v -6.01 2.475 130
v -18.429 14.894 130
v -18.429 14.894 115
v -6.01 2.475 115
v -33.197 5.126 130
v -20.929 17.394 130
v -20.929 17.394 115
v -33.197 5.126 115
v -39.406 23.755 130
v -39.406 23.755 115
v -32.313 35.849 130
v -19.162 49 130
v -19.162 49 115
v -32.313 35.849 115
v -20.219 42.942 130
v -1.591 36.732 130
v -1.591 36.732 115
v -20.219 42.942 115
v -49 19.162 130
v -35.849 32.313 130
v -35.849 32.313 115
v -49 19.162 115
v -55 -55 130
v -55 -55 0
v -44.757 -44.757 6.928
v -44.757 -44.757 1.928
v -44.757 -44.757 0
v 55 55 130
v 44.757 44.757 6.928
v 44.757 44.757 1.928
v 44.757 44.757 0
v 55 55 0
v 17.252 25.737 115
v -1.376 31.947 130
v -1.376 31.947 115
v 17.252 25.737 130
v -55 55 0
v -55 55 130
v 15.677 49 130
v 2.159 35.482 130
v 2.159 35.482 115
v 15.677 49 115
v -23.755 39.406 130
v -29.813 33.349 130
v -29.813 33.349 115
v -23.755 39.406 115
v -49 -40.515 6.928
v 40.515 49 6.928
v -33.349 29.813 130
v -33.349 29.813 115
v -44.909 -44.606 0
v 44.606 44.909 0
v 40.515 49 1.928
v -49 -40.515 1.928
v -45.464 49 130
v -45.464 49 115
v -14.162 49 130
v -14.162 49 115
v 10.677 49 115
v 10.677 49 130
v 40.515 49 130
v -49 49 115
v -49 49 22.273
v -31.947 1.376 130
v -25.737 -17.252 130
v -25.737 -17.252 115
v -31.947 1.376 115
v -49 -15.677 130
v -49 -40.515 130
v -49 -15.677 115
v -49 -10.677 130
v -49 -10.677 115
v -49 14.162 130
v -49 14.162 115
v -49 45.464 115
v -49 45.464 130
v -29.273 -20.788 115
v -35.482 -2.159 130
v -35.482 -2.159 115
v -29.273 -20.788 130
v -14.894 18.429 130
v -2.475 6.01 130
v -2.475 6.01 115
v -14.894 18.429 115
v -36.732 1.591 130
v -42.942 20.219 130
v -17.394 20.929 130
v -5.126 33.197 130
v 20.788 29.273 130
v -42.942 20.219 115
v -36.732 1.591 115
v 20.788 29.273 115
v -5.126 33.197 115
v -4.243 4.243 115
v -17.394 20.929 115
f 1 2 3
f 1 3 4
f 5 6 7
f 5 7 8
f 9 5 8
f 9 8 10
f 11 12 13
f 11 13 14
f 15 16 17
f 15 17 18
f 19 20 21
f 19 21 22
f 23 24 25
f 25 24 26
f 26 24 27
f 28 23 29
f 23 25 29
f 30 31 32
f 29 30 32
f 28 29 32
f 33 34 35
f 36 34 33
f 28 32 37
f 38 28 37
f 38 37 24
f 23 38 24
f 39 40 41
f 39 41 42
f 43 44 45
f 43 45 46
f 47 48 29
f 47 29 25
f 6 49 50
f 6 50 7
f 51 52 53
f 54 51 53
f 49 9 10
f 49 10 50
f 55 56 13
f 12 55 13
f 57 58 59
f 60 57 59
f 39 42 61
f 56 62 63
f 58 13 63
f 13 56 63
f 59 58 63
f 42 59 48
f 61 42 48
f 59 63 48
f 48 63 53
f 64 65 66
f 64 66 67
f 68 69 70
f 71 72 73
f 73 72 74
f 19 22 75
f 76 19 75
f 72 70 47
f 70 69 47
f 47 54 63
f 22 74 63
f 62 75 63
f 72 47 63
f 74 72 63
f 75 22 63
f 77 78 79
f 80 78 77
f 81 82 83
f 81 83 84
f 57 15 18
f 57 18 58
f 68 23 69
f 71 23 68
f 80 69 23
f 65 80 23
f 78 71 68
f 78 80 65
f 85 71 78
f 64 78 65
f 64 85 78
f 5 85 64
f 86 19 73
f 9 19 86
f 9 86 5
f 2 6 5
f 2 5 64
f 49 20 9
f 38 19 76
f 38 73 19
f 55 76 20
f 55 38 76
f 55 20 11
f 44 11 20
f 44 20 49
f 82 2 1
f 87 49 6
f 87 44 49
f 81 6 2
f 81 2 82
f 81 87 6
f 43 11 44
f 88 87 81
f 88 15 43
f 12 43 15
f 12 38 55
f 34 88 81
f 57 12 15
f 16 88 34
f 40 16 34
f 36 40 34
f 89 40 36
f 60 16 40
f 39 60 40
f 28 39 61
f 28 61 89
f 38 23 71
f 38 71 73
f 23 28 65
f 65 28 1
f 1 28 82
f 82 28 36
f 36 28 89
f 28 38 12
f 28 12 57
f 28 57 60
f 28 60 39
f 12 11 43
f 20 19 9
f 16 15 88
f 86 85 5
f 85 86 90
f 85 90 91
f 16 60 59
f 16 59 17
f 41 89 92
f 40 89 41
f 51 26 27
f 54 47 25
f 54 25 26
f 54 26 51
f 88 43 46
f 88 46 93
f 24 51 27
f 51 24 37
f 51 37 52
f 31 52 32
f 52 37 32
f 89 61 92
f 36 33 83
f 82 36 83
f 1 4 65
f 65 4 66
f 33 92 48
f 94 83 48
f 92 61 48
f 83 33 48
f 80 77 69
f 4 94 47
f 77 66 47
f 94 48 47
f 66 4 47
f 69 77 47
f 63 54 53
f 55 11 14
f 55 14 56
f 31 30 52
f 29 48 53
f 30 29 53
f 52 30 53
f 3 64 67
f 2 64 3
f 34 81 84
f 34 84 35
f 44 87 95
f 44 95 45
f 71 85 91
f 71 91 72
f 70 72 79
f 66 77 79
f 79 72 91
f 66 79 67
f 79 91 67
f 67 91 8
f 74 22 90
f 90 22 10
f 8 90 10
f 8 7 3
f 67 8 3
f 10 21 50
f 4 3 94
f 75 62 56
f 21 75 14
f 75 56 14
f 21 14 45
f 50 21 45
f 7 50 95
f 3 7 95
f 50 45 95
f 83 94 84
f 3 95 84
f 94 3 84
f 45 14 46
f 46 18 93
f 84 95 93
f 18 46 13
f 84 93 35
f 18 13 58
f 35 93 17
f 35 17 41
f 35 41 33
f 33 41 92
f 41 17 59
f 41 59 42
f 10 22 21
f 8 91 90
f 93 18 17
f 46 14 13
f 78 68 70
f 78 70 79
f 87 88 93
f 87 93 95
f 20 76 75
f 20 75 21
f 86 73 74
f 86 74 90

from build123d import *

# Parameters (mm, degrees)
F1_DEPTH    = 25
F2_SIZE2    = 24.99999
F2_SIZE     = 77.78174
F4_DEPTH    = 130
F5_W        = 126.5929291126
F5_H        = 5
F6_DEPTH    = 25
F7_T1_DEPTH = 126.5929291126
F9_DEPTH    = 15


# Not quite as in the source:
# - a fillet or chamfer that OpenCascade refuses, or shapes differently, is made with other operations: its cross-section is extruded or revolved along the edge and cut away or added
# - a fillet or chamfer is up to 0.001 mm smaller than in the source, because OpenCascade refuses the exact size


with BuildPart() as f1:
    # F0 (on Top) → F1 (new body)
    with BuildSketch(Plane.XY):
        Polygon((55, 55), (-55, 55), (-55, -55), align=None)
    extrude(amount=F1_DEPTH)

    # F2 (size 77.78175 and 25 in the source; OpenCascade refuses exactly that, so slightly less here)
    f2_edges = [f1.edges().sort_by_distance(p)[0] for p in [
        (0, 0, 25),
    ]]
    f2_side = f1.faces().sort_by_distance((-18.333333, 18.333333, 25))[0]
    chamfer(f2_edges, length=F2_SIZE, length2=F2_SIZE2, reference=f2_side)

    # F3 (on Top) → F4 (join)
    with BuildSketch(Plane.XY):
        Polygon((-55, 55), (-55, -55), (55, 55), align=None)
        Polygon((-49, -40.5147186258), (-49, 49), (40.5147186258, 49), align=None, mode=Mode.SUBTRACT)
    extrude(amount=F4_DEPTH)

    # F5 (on face) → F6 (cut)
    with BuildSketch(Plane(origin=(-4.2426406871, 4.2426406871, 0), x_dir=(-0.7071067812, -0.7071067812, 0), z_dir=(-0.7071067812, 0.7071067812, 0))):
        with Locations((0, 4.4284729387)):
            Rectangle(F5_W, F5_H)
    extrude(amount=-F6_DEPTH, mode=Mode.SUBTRACT)

    # F7: chamfer of 6 x 2 on 1 edges, made by hand

    # F7_s2 → F7_t1 (cut)
    with BuildSketch(Plane(origin=(44.7573593129, 44.7573593129, 0), x_dir=(0, 0, 1), z_dir=(-0.7071067812, -0.7071067812, 0))):
        Polygon((-0.0715270613, 0), (1.9284729387, 6), (1.9284729387, 0), align=None)
    extrude(amount=F7_T1_DEPTH, mode=Mode.SUBTRACT)

    # F8 (on face) → F9 (join)
    with BuildSketch(Plane.XY.offset(130)):
        Polygon((-45.4644660941, 49), (-49, 49), (-49, 45.4644660941), (-35.8485209767, 32.3129870708), (-49, 19.1615080475), (-49, 14.1615080475), (-42.9420274413, 20.2194806062), (-36.7324044532, 1.5906116418), (-49, -10.676983905), (-49, -15.676983905), (-35.4824044532, -2.1593883582), (-29.272970773, -20.7876893988), (-25.7374368671, -17.2521554928), (-31.9468705473, 1.3761455477), (-18.4292750005, 14.8937410945), (-6.0104076401, 2.4748737342), (-4.2426406871, 4.2426406871), (-2.4748737342, 6.0104076401), (-14.8937410945, 18.4292750005), (-1.3761455477, 31.9468705473), (17.2521554928, 25.7374368671), (20.7876893988, 29.272970773), (2.1593883582, 35.4824044532), (15.676983905, 49), (10.676983905, 49), (-1.5906116418, 36.7324044532), (-20.2194806062, 42.9420274413), (-14.1615080475, 49), (-19.1615080475, 49), (-32.3129870708, 35.8485209767), align=None)
        Polygon((-33.3485209767, 29.8129870708), (-20.9292750005, 17.3937410945), (-33.1968705473, 5.1261455477), (-39.4064935354, 23.7550145121), align=None, mode=Mode.SUBTRACT)
        Polygon((-17.3937410945, 20.9292750005), (-29.8129870708, 33.3485209767), (-23.7550145121, 39.4064935354), (-5.1261455477, 33.1968705473), align=None, mode=Mode.SUBTRACT)
    extrude(amount=-F9_DEPTH)


solid = f1.part
